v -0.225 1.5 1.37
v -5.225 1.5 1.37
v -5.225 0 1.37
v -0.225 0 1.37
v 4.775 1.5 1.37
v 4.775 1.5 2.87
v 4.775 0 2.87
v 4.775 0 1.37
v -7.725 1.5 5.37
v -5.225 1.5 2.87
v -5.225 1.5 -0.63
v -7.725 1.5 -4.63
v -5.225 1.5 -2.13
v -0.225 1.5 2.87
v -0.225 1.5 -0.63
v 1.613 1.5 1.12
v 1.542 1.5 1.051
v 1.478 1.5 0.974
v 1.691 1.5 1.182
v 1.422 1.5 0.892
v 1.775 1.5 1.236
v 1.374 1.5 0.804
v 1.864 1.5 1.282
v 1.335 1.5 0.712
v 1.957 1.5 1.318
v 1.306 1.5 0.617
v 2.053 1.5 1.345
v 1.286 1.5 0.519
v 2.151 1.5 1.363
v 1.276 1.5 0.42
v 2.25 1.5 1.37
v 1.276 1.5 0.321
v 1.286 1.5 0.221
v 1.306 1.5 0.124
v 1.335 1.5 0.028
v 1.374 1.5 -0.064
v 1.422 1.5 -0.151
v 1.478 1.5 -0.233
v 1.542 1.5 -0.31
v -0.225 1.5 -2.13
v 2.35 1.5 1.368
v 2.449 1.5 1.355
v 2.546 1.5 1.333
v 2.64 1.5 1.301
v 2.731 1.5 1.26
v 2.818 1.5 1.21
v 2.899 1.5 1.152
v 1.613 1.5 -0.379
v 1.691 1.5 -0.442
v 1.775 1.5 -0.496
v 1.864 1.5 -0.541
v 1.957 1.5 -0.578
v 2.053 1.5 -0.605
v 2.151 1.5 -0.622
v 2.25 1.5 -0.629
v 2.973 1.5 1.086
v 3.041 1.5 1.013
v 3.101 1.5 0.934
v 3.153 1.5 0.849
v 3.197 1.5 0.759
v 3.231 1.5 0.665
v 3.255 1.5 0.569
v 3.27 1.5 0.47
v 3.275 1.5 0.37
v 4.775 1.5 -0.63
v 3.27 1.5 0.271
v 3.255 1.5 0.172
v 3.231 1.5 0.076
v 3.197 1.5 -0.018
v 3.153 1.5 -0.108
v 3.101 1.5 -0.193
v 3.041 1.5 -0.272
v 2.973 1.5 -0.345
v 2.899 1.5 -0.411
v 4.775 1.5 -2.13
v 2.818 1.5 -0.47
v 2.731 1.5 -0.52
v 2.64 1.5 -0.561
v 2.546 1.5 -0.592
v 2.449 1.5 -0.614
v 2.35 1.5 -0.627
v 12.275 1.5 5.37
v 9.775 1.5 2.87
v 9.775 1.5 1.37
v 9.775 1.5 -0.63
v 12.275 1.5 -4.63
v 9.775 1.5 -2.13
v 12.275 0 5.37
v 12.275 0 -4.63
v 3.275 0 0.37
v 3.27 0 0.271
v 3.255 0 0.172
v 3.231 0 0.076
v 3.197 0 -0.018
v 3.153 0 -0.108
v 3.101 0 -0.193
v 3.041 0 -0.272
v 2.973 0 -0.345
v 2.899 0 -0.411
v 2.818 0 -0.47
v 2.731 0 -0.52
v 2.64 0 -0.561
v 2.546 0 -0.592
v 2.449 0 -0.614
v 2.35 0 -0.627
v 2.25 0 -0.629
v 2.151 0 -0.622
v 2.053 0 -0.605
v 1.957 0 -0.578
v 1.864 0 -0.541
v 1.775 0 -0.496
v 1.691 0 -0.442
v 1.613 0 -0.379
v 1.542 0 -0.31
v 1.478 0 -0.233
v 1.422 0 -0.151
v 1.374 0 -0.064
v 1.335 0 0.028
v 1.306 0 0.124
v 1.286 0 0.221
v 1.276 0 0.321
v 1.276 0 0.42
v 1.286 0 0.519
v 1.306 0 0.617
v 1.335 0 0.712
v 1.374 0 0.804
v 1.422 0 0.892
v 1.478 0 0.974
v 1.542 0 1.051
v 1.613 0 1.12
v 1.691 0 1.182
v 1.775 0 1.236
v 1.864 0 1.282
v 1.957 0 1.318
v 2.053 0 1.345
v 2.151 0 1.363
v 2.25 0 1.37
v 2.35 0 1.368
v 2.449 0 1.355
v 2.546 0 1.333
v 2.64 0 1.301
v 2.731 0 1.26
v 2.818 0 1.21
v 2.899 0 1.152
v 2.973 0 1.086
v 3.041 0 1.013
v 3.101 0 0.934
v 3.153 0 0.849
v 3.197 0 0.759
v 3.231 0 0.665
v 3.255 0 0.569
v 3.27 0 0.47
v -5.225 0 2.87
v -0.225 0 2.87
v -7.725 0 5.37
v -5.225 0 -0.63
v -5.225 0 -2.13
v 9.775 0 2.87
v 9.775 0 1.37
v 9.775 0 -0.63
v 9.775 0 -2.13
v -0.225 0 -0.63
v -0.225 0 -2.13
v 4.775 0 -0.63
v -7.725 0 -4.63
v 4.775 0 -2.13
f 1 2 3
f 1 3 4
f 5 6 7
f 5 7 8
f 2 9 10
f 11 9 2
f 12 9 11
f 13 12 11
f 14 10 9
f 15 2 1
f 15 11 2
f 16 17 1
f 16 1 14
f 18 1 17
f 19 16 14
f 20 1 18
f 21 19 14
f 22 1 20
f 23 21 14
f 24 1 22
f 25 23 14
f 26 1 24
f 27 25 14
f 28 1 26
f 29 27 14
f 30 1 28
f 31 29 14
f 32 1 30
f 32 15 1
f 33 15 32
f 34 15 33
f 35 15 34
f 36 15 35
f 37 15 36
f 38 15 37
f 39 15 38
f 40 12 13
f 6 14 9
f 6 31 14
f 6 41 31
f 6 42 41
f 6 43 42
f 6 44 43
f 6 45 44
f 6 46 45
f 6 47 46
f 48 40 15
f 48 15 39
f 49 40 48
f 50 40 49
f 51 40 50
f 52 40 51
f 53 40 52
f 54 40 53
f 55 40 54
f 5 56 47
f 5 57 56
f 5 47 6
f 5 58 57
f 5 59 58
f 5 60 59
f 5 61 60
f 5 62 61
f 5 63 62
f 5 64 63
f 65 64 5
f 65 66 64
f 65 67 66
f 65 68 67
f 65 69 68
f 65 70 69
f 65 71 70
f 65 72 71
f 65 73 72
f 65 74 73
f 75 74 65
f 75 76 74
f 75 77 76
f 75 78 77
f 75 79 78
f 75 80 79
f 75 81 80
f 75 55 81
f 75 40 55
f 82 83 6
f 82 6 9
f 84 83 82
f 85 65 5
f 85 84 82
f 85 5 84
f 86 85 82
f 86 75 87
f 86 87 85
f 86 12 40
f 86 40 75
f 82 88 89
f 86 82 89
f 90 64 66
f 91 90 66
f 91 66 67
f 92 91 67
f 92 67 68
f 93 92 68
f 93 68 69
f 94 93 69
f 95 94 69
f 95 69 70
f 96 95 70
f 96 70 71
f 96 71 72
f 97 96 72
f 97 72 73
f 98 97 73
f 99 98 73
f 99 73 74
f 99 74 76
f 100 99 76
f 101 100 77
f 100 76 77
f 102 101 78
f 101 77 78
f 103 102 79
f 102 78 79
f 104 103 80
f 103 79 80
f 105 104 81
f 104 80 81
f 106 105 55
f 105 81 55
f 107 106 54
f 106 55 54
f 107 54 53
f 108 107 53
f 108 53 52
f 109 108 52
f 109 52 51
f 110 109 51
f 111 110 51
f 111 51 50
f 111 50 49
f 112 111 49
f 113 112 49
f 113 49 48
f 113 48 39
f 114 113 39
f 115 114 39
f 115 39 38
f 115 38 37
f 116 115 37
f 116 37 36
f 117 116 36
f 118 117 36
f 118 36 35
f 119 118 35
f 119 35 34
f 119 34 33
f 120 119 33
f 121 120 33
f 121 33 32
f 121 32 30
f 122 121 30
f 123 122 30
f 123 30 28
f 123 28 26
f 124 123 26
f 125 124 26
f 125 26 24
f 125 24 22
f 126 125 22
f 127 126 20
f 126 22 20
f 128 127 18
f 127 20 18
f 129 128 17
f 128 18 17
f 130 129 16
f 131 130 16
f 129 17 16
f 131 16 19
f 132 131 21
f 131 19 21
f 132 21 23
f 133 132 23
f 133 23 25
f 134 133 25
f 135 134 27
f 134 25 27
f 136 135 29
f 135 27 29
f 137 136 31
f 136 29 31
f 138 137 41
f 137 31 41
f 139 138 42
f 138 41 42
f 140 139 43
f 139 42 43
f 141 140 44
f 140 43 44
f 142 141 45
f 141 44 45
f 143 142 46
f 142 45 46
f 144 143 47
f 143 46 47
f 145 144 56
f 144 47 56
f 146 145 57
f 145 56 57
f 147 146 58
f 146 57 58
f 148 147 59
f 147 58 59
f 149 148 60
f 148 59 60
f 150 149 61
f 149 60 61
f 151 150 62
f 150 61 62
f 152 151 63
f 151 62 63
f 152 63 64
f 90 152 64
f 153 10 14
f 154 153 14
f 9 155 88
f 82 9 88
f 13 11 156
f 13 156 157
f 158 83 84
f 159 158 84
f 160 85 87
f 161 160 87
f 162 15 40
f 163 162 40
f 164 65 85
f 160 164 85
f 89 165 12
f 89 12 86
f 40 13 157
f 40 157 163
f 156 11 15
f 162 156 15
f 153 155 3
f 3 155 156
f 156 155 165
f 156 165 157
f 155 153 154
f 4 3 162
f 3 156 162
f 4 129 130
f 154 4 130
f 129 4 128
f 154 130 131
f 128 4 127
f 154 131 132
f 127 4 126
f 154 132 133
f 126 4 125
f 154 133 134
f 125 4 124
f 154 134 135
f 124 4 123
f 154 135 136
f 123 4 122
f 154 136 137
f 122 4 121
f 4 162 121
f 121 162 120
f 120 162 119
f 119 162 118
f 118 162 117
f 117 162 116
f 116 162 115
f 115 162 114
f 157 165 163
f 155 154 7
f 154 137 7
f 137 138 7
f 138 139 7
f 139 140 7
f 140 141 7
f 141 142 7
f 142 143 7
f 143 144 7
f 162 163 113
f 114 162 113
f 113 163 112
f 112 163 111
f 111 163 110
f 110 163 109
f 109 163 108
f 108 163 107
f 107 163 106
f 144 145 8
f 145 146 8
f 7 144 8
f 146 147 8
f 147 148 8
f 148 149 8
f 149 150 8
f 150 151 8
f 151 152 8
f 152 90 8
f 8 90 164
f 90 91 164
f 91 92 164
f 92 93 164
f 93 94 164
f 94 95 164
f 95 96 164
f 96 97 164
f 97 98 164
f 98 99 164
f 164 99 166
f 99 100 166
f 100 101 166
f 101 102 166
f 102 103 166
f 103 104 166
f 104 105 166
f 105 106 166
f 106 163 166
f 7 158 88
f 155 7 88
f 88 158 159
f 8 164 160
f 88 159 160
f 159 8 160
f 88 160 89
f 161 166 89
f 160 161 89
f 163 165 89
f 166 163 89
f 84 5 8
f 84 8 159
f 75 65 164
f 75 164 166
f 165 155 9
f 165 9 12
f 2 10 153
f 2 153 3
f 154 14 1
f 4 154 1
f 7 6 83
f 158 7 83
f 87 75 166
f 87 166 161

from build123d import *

# Parameters (mm, degrees)
SKETCH1_W           = 20
SKETCH1_H           = 10
BOSS_EXTRUDE1_DEPTH = 1.5
SKETCH3_W           = 5
SKETCH3_H           = 1.5
CUT_EXTRUDE1_DEPTH  = 2
SKETCH2_R           = 1
CUT_EXTRUDE2_DEPTH  = 2


with BuildPart() as part:
    # Sketch1 → Boss-Extrude1 (new body)
    with BuildSketch(Plane(origin=(0, 0, 0), x_dir=(1, 0, 0), z_dir=(0, 1, 0))):
        with Locations((2.275132275, -0.37037037)):
            Rectangle(SKETCH1_W, SKETCH1_H)
    extrude(amount=BOSS_EXTRUDE1_DEPTH)

    # Sketch3 → Cut-Extrude1 (cut)
    with BuildSketch(Plane(origin=(0, 1.5, 0), x_dir=(1, 0, 0), z_dir=(0, 1, 0))):
        with Locations((-2.724867725, 1.37962963)):
            Rectangle(SKETCH3_W, SKETCH3_H)
        with Locations((7.275132275, 1.37962963)):
            Rectangle(SKETCH3_W, SKETCH3_H)
        with Locations((7.275132275, -2.12037037)):
            Rectangle(SKETCH3_W, SKETCH3_H)
        with Locations((-2.724867725, -2.12037037)):
            Rectangle(SKETCH3_W, SKETCH3_H)
    extrude(amount=-CUT_EXTRUDE1_DEPTH, mode=Mode.SUBTRACT)

    # Sketch2 → Cut-Extrude2 (cut)
    with BuildSketch(Plane(origin=(0, 1.5, 0), x_dir=(1, 0, 0), z_dir=(0, 1, 0))):
        with Locations((2.275132275, -0.37037037)):
            Circle(SKETCH2_R)
    extrude(amount=-CUT_EXTRUDE2_DEPTH, mode=Mode.SUBTRACT)


solid = part.part
